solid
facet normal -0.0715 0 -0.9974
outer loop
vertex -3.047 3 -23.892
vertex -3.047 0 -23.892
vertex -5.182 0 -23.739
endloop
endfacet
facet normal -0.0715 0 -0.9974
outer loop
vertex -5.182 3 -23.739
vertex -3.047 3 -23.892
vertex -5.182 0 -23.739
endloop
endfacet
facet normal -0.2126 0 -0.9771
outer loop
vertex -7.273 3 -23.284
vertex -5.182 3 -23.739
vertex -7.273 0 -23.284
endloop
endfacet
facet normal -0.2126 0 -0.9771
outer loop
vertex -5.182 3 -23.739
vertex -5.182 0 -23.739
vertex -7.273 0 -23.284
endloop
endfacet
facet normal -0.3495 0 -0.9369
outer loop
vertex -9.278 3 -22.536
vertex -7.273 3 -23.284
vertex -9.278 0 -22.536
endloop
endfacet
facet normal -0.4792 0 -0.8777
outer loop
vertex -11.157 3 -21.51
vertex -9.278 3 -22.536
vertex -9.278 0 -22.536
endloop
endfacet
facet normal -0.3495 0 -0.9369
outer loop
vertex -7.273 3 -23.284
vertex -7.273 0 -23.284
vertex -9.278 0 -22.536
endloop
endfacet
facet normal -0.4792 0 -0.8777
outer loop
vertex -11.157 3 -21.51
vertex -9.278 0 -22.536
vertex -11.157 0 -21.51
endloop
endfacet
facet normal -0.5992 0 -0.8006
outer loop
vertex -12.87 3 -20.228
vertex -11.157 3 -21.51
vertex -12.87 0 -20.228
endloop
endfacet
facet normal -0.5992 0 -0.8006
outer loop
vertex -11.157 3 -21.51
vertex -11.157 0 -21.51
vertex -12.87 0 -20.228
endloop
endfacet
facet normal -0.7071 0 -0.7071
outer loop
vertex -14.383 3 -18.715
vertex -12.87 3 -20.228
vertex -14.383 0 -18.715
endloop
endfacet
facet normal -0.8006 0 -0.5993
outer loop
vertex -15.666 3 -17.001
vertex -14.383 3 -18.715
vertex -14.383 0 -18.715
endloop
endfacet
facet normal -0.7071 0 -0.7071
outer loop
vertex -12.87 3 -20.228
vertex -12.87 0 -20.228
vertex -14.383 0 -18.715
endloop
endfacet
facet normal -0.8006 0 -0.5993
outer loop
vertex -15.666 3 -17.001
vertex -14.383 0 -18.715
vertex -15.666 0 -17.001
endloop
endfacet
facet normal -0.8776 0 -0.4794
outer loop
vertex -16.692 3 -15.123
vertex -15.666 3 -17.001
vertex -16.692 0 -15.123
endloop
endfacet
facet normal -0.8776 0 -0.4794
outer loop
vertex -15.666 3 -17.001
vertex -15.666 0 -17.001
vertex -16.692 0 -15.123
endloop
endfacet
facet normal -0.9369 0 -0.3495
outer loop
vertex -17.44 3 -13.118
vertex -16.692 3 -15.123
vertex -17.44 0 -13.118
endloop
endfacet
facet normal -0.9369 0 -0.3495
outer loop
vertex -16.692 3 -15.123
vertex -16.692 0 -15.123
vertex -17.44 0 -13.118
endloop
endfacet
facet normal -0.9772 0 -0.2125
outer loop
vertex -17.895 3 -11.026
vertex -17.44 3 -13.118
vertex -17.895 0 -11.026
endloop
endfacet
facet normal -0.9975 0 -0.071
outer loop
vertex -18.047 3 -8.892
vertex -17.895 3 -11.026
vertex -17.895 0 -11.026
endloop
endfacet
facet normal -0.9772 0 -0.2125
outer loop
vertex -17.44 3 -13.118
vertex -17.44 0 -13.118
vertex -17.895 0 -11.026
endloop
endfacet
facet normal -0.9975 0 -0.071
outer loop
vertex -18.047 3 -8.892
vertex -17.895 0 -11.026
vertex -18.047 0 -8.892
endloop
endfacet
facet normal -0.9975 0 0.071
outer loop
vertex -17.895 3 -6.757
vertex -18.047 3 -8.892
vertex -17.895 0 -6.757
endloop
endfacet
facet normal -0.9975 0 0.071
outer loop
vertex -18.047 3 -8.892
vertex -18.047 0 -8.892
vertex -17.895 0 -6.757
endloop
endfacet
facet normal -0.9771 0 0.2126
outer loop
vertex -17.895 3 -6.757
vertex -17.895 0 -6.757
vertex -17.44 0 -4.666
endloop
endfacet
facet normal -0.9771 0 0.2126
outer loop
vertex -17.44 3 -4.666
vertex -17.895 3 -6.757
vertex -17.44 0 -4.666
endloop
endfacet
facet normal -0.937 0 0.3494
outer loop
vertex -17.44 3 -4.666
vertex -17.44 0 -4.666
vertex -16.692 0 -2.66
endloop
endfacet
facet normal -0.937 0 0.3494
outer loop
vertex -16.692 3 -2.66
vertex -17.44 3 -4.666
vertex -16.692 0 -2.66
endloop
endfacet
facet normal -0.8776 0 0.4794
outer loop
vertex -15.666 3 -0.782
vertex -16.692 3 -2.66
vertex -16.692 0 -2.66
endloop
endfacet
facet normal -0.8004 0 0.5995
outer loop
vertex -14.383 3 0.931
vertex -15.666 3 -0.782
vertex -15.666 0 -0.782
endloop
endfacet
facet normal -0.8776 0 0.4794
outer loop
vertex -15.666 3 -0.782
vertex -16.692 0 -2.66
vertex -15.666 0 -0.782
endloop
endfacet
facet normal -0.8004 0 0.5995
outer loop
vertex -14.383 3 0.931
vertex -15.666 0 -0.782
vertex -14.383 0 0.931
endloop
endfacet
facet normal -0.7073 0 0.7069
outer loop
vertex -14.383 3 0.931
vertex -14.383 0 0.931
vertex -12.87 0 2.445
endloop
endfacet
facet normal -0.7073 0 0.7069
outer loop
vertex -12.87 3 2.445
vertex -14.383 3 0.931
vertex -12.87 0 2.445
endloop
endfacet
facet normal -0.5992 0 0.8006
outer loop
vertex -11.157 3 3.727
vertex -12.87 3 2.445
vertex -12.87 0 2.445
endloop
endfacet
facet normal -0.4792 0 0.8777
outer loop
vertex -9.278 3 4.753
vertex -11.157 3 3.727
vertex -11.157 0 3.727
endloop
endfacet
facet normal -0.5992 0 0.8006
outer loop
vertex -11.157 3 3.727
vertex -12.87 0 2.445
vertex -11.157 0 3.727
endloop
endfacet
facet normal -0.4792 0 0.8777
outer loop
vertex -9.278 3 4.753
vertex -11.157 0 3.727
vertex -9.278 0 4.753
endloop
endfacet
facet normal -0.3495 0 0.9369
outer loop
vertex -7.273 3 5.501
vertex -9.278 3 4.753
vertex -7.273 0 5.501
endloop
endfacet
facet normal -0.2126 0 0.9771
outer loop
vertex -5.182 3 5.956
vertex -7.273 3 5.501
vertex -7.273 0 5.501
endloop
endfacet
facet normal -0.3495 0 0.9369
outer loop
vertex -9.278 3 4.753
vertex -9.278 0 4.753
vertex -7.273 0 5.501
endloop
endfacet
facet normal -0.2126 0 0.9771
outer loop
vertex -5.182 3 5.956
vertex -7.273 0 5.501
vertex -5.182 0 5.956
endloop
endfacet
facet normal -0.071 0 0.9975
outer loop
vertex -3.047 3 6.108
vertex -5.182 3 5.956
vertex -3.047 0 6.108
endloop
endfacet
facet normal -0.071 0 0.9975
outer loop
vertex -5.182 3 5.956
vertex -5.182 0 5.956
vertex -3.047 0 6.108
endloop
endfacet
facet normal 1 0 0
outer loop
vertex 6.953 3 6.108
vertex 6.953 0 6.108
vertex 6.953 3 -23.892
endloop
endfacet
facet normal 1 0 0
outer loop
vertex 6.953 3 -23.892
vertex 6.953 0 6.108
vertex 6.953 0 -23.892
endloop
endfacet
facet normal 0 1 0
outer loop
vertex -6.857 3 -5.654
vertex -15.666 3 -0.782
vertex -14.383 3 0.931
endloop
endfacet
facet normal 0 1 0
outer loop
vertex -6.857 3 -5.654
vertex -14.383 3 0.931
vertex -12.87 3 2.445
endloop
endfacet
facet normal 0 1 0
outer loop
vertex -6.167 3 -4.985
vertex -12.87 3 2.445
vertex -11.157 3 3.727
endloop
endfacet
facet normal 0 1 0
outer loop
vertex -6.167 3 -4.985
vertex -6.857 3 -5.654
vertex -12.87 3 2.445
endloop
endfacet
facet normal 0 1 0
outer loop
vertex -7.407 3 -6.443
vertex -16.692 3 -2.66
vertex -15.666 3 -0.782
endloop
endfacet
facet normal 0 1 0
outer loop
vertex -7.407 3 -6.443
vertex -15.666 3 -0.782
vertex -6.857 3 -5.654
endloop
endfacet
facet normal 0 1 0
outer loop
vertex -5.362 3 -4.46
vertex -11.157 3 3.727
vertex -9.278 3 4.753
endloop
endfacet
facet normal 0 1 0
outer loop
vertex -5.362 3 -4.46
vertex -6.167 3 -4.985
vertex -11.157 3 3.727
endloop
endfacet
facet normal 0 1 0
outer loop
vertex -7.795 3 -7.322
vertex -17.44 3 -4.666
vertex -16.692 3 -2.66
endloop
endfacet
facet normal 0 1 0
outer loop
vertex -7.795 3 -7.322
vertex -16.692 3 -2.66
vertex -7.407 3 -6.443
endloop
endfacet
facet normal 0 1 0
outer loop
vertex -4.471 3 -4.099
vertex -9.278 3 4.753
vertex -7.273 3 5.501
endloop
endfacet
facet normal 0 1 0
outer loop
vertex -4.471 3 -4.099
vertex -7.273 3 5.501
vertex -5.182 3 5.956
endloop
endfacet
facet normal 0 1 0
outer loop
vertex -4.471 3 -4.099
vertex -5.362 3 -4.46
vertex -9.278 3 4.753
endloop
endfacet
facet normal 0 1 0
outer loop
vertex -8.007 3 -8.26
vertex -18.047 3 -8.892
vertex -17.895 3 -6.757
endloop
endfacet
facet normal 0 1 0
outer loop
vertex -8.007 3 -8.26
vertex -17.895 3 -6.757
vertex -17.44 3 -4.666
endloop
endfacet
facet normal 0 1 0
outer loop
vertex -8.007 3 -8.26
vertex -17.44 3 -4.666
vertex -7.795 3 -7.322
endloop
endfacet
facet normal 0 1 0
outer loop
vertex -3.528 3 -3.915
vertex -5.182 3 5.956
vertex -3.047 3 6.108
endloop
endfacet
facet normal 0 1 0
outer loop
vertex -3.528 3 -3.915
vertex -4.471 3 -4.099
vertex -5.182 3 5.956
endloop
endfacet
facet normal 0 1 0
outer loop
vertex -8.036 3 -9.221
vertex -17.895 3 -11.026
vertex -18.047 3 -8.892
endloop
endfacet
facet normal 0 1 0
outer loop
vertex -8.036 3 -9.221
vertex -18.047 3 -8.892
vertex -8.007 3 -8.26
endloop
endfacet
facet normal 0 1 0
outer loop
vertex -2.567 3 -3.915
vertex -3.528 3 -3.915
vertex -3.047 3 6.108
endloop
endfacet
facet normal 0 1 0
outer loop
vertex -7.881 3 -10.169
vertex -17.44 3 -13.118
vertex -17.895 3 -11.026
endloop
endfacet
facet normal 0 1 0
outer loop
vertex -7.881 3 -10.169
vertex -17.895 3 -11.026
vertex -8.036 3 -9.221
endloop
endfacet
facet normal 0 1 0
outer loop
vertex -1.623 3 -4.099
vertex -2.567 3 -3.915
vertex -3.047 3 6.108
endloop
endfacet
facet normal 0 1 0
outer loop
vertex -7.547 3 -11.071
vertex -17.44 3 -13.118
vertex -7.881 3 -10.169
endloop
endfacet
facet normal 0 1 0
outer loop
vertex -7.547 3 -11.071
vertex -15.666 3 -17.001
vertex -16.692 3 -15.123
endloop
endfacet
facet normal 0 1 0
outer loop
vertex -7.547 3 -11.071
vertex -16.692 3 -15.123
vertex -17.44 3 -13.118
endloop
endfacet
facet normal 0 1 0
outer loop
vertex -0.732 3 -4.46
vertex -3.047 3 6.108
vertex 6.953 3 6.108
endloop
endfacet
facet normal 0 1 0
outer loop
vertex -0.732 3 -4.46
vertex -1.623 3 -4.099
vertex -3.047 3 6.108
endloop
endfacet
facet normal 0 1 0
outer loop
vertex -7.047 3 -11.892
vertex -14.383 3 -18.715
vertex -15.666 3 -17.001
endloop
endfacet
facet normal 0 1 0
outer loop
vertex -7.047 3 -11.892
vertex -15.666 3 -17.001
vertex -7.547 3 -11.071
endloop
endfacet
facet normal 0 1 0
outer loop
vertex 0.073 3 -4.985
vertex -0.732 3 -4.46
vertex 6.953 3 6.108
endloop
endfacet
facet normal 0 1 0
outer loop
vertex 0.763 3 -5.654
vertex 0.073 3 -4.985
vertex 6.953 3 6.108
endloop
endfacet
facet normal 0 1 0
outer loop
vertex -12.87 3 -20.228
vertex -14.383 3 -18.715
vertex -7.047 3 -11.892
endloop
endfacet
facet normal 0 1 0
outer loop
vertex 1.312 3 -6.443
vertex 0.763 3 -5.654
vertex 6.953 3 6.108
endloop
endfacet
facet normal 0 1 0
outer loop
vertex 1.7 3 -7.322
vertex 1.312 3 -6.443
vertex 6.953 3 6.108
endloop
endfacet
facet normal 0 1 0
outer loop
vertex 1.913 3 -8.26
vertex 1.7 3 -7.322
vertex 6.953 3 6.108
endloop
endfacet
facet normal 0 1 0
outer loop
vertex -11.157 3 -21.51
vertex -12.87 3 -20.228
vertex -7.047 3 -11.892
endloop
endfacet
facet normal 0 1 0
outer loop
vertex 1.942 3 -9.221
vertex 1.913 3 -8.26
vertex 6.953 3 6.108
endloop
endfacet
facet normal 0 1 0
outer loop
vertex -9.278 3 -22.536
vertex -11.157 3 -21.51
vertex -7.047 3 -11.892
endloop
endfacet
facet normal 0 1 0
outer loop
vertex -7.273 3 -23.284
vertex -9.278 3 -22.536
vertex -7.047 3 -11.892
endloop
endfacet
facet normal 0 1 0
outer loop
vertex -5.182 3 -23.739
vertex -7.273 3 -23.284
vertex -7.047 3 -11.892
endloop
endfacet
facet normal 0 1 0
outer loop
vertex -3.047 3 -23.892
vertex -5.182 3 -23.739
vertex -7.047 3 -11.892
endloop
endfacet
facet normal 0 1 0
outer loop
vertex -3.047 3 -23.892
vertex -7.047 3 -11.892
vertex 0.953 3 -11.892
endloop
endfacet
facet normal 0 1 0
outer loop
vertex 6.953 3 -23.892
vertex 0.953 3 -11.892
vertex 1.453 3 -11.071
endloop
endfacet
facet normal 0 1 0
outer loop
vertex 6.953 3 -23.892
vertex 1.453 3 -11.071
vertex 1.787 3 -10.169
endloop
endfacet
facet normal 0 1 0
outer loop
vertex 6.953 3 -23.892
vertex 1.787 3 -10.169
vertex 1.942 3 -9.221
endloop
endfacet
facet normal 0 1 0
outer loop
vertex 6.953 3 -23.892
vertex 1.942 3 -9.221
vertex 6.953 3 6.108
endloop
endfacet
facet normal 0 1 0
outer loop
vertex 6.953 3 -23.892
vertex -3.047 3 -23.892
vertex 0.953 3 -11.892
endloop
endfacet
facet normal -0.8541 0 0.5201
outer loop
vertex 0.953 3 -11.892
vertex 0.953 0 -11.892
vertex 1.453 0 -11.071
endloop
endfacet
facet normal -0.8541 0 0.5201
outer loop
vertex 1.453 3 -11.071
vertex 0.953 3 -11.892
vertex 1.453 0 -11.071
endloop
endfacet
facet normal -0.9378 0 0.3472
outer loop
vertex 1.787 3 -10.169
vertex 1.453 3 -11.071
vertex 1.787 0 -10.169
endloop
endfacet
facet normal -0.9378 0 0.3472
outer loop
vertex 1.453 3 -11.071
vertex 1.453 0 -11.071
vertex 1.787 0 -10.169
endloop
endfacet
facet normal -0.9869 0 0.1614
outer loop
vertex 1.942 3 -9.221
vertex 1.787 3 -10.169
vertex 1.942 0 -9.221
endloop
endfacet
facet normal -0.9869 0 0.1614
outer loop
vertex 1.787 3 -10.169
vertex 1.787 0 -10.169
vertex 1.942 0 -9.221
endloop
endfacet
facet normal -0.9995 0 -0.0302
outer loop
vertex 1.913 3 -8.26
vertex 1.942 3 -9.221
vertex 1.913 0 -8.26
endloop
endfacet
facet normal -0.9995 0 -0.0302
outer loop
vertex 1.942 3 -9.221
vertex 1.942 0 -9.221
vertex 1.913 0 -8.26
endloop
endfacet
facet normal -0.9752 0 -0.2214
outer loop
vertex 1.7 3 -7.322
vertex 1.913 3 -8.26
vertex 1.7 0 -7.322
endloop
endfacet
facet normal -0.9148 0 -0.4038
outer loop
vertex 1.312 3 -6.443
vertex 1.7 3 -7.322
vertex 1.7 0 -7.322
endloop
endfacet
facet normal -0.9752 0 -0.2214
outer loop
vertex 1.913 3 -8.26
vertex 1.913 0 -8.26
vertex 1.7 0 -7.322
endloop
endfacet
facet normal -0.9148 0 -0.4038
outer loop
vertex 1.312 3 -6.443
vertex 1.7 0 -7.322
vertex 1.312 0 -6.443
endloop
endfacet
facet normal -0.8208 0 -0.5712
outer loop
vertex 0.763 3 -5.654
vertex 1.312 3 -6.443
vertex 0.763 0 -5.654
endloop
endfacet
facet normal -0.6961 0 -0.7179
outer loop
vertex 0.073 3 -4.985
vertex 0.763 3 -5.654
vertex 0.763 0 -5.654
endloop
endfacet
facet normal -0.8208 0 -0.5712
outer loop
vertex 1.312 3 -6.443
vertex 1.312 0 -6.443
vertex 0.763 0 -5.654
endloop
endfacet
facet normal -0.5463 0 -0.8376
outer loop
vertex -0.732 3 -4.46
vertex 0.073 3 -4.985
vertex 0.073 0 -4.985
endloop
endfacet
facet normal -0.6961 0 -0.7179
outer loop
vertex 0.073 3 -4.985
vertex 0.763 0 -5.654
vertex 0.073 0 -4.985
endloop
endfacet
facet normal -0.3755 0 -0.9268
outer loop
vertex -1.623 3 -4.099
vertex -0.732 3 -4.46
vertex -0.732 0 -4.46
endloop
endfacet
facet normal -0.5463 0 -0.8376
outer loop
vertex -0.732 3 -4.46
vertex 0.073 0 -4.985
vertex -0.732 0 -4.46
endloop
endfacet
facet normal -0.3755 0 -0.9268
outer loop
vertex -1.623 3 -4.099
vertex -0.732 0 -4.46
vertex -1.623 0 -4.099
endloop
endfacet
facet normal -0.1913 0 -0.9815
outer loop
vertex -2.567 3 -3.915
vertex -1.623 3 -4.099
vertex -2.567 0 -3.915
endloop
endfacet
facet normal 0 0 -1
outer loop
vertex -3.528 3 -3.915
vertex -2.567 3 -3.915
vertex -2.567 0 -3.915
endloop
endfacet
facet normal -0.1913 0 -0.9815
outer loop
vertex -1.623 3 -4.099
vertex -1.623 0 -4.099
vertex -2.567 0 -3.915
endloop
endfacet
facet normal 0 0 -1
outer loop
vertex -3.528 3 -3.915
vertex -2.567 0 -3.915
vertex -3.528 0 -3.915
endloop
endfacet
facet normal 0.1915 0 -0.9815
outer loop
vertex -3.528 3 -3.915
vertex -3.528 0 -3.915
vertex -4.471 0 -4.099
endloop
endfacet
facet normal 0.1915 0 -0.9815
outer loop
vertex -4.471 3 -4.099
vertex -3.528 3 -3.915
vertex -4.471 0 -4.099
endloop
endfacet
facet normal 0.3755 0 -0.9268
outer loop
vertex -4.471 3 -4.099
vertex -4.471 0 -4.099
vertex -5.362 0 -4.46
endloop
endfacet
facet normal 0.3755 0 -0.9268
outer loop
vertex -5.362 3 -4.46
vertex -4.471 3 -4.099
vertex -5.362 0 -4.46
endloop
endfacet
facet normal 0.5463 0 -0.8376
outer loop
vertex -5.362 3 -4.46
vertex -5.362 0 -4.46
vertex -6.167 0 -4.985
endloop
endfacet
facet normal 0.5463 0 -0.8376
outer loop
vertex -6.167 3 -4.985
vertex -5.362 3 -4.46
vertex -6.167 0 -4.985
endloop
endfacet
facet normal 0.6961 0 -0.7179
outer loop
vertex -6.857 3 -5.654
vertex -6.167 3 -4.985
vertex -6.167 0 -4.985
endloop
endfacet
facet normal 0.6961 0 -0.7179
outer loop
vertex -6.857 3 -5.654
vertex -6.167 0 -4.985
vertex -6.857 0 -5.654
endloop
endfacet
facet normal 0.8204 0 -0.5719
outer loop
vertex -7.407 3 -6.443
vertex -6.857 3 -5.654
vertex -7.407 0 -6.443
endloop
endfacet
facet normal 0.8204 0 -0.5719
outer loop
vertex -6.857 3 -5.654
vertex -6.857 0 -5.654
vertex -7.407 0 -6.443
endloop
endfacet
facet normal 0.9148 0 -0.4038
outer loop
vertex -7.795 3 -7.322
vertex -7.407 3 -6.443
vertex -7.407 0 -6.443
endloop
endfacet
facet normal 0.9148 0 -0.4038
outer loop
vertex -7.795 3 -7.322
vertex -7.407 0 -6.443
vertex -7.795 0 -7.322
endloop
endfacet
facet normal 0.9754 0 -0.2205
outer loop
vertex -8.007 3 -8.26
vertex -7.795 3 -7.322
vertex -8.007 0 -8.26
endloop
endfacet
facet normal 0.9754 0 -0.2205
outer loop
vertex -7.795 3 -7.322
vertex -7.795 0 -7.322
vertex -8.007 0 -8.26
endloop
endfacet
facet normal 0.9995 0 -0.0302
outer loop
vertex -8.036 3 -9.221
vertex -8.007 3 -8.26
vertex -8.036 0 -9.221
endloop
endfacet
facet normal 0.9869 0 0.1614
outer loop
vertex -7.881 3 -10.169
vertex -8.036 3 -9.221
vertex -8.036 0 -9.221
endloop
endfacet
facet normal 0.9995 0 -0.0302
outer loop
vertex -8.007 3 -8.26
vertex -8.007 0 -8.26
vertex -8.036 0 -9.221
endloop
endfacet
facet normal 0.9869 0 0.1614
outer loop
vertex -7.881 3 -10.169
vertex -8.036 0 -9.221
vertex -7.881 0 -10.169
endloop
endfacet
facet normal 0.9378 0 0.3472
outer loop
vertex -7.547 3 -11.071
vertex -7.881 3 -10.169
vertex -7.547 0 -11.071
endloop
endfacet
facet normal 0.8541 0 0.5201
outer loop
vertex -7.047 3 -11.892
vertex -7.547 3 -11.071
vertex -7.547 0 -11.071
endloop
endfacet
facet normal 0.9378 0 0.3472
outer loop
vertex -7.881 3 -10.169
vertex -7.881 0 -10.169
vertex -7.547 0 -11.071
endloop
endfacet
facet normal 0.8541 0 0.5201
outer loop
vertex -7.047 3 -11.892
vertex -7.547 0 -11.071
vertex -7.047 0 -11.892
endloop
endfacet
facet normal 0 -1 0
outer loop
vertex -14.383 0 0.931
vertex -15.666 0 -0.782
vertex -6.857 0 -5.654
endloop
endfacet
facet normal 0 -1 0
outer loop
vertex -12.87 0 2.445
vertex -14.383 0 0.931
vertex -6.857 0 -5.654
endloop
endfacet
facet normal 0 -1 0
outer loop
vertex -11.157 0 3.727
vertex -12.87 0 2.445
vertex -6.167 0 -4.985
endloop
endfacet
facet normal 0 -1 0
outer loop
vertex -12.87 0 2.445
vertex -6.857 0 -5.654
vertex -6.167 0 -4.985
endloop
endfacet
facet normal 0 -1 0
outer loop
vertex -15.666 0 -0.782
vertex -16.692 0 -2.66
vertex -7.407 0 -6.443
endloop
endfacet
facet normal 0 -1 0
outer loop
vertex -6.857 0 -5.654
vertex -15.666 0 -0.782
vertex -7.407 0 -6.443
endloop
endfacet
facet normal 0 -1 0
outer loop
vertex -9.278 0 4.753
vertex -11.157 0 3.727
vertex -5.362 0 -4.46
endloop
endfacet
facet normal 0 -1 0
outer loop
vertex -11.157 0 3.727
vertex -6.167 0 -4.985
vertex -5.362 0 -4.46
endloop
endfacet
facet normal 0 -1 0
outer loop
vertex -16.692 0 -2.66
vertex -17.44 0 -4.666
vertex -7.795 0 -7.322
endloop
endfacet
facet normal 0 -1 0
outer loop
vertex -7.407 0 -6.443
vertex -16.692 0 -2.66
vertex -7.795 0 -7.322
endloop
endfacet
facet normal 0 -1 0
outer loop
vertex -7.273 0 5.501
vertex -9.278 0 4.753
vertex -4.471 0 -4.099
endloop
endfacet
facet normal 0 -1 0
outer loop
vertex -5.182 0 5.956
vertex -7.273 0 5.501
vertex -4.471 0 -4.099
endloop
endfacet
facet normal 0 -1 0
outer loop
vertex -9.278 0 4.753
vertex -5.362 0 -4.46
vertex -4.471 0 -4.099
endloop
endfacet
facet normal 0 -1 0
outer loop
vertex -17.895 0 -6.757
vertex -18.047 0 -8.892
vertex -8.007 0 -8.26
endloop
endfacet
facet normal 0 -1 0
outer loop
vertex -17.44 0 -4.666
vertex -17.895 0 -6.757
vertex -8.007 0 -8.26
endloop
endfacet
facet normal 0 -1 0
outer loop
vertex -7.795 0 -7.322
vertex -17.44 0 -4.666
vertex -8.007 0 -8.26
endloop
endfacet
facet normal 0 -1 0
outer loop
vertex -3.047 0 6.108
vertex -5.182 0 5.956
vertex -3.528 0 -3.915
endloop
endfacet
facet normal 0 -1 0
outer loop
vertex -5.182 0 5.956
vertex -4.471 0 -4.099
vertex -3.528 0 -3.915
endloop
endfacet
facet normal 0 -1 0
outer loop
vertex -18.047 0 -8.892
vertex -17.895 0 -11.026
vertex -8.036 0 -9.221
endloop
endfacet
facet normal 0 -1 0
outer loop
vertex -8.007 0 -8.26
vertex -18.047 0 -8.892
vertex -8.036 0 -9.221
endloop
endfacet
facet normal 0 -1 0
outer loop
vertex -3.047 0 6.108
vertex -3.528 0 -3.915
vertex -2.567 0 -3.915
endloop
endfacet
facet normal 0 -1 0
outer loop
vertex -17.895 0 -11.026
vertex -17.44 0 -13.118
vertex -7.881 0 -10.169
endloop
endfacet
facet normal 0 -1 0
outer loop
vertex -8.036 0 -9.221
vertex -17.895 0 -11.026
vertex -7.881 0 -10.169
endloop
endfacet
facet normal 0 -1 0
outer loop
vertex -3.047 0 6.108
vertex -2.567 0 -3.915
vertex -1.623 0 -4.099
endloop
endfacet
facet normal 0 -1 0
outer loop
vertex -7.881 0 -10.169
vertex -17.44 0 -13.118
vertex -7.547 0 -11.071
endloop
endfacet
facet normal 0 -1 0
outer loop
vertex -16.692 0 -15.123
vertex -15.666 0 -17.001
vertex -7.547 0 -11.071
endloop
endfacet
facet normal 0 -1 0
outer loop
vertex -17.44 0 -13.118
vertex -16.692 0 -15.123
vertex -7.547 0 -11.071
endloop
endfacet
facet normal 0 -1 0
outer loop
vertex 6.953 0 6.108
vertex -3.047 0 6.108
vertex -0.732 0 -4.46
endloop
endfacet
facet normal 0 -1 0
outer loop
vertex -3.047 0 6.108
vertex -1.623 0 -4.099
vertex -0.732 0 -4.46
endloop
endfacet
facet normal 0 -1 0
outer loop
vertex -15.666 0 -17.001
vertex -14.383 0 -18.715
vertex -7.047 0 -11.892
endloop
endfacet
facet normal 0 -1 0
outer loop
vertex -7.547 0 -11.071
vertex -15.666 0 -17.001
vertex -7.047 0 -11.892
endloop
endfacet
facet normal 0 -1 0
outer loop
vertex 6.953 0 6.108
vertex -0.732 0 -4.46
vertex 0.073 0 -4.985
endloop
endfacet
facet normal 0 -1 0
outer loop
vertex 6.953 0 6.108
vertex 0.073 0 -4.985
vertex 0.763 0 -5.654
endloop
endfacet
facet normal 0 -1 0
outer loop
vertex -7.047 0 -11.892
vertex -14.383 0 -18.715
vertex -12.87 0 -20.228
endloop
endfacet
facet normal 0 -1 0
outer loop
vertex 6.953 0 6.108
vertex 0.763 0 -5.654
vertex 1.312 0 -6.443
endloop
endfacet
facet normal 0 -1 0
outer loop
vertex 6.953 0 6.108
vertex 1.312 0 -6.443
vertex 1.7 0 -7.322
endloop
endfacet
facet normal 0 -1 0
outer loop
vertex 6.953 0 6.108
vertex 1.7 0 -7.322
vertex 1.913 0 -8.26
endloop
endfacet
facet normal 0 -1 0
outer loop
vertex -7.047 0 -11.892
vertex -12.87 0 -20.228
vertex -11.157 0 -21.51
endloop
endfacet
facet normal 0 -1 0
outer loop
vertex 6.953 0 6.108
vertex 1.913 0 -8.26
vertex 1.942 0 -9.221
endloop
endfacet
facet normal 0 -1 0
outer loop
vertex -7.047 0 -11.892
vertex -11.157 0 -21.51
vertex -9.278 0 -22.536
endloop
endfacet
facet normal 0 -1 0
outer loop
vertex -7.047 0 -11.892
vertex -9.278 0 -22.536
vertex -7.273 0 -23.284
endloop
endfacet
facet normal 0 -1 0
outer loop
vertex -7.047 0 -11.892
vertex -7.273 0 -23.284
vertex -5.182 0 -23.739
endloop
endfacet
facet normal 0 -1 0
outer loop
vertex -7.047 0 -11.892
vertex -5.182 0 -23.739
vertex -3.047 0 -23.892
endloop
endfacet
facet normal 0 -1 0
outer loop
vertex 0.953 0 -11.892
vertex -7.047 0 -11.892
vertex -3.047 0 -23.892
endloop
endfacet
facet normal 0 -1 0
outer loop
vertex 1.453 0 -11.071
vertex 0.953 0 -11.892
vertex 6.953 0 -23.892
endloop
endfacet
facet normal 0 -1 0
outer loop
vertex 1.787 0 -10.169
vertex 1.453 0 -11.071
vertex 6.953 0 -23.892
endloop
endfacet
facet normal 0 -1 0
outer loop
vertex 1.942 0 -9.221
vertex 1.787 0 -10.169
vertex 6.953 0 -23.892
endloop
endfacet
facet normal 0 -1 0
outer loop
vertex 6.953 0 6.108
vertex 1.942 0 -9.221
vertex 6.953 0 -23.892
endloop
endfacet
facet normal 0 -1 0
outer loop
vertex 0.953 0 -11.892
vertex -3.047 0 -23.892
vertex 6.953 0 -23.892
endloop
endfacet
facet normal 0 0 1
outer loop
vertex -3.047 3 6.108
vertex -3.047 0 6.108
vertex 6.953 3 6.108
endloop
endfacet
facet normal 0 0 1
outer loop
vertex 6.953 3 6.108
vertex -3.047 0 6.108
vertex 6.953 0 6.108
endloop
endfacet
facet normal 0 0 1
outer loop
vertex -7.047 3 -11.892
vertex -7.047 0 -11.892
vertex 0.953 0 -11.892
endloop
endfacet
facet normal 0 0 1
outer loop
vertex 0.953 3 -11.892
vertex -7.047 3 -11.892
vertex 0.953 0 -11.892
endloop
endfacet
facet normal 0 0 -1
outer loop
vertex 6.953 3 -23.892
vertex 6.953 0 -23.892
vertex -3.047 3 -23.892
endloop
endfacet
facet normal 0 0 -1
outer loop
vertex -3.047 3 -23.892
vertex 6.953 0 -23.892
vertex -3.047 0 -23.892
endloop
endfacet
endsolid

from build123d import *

# Parameters (mm, degrees)
BOSS_EXTRUDE3_DEPTH = 3


with BuildPart() as part:
    # Sketch4 → Boss-Extrude3 (new body)
    with BuildSketch(Plane(origin=(0, 0, 0), x_dir=(1, 0, 0), z_dir=(0, 1, 0))):
        with BuildLine():
            ThreePointArc((-3.047220201, 23.891690771), (-18.047220201, 8.891690771), (-3.047220201, -6.108309229))
            Line((-3.047220201, -6.108309229), (6.952779799, -6.108309229))
            Line((6.952779799, -6.108309229), (6.952779799, 23.891690771))
            Line((6.952779799, 23.891690771), (-3.047220201, 23.891690771))
        make_face()
        with BuildLine():
            Line((-7.047220201, 11.891690771), (0.952779799, 11.891690771))
            ThreePointArc((0.952779799, 11.891690771), (-3.047220201, 3.891690771), (-7.047220201, 11.891690771))
        make_face(mode=Mode.SUBTRACT)
    extrude(amount=BOSS_EXTRUDE3_DEPTH)


solid = part.part
